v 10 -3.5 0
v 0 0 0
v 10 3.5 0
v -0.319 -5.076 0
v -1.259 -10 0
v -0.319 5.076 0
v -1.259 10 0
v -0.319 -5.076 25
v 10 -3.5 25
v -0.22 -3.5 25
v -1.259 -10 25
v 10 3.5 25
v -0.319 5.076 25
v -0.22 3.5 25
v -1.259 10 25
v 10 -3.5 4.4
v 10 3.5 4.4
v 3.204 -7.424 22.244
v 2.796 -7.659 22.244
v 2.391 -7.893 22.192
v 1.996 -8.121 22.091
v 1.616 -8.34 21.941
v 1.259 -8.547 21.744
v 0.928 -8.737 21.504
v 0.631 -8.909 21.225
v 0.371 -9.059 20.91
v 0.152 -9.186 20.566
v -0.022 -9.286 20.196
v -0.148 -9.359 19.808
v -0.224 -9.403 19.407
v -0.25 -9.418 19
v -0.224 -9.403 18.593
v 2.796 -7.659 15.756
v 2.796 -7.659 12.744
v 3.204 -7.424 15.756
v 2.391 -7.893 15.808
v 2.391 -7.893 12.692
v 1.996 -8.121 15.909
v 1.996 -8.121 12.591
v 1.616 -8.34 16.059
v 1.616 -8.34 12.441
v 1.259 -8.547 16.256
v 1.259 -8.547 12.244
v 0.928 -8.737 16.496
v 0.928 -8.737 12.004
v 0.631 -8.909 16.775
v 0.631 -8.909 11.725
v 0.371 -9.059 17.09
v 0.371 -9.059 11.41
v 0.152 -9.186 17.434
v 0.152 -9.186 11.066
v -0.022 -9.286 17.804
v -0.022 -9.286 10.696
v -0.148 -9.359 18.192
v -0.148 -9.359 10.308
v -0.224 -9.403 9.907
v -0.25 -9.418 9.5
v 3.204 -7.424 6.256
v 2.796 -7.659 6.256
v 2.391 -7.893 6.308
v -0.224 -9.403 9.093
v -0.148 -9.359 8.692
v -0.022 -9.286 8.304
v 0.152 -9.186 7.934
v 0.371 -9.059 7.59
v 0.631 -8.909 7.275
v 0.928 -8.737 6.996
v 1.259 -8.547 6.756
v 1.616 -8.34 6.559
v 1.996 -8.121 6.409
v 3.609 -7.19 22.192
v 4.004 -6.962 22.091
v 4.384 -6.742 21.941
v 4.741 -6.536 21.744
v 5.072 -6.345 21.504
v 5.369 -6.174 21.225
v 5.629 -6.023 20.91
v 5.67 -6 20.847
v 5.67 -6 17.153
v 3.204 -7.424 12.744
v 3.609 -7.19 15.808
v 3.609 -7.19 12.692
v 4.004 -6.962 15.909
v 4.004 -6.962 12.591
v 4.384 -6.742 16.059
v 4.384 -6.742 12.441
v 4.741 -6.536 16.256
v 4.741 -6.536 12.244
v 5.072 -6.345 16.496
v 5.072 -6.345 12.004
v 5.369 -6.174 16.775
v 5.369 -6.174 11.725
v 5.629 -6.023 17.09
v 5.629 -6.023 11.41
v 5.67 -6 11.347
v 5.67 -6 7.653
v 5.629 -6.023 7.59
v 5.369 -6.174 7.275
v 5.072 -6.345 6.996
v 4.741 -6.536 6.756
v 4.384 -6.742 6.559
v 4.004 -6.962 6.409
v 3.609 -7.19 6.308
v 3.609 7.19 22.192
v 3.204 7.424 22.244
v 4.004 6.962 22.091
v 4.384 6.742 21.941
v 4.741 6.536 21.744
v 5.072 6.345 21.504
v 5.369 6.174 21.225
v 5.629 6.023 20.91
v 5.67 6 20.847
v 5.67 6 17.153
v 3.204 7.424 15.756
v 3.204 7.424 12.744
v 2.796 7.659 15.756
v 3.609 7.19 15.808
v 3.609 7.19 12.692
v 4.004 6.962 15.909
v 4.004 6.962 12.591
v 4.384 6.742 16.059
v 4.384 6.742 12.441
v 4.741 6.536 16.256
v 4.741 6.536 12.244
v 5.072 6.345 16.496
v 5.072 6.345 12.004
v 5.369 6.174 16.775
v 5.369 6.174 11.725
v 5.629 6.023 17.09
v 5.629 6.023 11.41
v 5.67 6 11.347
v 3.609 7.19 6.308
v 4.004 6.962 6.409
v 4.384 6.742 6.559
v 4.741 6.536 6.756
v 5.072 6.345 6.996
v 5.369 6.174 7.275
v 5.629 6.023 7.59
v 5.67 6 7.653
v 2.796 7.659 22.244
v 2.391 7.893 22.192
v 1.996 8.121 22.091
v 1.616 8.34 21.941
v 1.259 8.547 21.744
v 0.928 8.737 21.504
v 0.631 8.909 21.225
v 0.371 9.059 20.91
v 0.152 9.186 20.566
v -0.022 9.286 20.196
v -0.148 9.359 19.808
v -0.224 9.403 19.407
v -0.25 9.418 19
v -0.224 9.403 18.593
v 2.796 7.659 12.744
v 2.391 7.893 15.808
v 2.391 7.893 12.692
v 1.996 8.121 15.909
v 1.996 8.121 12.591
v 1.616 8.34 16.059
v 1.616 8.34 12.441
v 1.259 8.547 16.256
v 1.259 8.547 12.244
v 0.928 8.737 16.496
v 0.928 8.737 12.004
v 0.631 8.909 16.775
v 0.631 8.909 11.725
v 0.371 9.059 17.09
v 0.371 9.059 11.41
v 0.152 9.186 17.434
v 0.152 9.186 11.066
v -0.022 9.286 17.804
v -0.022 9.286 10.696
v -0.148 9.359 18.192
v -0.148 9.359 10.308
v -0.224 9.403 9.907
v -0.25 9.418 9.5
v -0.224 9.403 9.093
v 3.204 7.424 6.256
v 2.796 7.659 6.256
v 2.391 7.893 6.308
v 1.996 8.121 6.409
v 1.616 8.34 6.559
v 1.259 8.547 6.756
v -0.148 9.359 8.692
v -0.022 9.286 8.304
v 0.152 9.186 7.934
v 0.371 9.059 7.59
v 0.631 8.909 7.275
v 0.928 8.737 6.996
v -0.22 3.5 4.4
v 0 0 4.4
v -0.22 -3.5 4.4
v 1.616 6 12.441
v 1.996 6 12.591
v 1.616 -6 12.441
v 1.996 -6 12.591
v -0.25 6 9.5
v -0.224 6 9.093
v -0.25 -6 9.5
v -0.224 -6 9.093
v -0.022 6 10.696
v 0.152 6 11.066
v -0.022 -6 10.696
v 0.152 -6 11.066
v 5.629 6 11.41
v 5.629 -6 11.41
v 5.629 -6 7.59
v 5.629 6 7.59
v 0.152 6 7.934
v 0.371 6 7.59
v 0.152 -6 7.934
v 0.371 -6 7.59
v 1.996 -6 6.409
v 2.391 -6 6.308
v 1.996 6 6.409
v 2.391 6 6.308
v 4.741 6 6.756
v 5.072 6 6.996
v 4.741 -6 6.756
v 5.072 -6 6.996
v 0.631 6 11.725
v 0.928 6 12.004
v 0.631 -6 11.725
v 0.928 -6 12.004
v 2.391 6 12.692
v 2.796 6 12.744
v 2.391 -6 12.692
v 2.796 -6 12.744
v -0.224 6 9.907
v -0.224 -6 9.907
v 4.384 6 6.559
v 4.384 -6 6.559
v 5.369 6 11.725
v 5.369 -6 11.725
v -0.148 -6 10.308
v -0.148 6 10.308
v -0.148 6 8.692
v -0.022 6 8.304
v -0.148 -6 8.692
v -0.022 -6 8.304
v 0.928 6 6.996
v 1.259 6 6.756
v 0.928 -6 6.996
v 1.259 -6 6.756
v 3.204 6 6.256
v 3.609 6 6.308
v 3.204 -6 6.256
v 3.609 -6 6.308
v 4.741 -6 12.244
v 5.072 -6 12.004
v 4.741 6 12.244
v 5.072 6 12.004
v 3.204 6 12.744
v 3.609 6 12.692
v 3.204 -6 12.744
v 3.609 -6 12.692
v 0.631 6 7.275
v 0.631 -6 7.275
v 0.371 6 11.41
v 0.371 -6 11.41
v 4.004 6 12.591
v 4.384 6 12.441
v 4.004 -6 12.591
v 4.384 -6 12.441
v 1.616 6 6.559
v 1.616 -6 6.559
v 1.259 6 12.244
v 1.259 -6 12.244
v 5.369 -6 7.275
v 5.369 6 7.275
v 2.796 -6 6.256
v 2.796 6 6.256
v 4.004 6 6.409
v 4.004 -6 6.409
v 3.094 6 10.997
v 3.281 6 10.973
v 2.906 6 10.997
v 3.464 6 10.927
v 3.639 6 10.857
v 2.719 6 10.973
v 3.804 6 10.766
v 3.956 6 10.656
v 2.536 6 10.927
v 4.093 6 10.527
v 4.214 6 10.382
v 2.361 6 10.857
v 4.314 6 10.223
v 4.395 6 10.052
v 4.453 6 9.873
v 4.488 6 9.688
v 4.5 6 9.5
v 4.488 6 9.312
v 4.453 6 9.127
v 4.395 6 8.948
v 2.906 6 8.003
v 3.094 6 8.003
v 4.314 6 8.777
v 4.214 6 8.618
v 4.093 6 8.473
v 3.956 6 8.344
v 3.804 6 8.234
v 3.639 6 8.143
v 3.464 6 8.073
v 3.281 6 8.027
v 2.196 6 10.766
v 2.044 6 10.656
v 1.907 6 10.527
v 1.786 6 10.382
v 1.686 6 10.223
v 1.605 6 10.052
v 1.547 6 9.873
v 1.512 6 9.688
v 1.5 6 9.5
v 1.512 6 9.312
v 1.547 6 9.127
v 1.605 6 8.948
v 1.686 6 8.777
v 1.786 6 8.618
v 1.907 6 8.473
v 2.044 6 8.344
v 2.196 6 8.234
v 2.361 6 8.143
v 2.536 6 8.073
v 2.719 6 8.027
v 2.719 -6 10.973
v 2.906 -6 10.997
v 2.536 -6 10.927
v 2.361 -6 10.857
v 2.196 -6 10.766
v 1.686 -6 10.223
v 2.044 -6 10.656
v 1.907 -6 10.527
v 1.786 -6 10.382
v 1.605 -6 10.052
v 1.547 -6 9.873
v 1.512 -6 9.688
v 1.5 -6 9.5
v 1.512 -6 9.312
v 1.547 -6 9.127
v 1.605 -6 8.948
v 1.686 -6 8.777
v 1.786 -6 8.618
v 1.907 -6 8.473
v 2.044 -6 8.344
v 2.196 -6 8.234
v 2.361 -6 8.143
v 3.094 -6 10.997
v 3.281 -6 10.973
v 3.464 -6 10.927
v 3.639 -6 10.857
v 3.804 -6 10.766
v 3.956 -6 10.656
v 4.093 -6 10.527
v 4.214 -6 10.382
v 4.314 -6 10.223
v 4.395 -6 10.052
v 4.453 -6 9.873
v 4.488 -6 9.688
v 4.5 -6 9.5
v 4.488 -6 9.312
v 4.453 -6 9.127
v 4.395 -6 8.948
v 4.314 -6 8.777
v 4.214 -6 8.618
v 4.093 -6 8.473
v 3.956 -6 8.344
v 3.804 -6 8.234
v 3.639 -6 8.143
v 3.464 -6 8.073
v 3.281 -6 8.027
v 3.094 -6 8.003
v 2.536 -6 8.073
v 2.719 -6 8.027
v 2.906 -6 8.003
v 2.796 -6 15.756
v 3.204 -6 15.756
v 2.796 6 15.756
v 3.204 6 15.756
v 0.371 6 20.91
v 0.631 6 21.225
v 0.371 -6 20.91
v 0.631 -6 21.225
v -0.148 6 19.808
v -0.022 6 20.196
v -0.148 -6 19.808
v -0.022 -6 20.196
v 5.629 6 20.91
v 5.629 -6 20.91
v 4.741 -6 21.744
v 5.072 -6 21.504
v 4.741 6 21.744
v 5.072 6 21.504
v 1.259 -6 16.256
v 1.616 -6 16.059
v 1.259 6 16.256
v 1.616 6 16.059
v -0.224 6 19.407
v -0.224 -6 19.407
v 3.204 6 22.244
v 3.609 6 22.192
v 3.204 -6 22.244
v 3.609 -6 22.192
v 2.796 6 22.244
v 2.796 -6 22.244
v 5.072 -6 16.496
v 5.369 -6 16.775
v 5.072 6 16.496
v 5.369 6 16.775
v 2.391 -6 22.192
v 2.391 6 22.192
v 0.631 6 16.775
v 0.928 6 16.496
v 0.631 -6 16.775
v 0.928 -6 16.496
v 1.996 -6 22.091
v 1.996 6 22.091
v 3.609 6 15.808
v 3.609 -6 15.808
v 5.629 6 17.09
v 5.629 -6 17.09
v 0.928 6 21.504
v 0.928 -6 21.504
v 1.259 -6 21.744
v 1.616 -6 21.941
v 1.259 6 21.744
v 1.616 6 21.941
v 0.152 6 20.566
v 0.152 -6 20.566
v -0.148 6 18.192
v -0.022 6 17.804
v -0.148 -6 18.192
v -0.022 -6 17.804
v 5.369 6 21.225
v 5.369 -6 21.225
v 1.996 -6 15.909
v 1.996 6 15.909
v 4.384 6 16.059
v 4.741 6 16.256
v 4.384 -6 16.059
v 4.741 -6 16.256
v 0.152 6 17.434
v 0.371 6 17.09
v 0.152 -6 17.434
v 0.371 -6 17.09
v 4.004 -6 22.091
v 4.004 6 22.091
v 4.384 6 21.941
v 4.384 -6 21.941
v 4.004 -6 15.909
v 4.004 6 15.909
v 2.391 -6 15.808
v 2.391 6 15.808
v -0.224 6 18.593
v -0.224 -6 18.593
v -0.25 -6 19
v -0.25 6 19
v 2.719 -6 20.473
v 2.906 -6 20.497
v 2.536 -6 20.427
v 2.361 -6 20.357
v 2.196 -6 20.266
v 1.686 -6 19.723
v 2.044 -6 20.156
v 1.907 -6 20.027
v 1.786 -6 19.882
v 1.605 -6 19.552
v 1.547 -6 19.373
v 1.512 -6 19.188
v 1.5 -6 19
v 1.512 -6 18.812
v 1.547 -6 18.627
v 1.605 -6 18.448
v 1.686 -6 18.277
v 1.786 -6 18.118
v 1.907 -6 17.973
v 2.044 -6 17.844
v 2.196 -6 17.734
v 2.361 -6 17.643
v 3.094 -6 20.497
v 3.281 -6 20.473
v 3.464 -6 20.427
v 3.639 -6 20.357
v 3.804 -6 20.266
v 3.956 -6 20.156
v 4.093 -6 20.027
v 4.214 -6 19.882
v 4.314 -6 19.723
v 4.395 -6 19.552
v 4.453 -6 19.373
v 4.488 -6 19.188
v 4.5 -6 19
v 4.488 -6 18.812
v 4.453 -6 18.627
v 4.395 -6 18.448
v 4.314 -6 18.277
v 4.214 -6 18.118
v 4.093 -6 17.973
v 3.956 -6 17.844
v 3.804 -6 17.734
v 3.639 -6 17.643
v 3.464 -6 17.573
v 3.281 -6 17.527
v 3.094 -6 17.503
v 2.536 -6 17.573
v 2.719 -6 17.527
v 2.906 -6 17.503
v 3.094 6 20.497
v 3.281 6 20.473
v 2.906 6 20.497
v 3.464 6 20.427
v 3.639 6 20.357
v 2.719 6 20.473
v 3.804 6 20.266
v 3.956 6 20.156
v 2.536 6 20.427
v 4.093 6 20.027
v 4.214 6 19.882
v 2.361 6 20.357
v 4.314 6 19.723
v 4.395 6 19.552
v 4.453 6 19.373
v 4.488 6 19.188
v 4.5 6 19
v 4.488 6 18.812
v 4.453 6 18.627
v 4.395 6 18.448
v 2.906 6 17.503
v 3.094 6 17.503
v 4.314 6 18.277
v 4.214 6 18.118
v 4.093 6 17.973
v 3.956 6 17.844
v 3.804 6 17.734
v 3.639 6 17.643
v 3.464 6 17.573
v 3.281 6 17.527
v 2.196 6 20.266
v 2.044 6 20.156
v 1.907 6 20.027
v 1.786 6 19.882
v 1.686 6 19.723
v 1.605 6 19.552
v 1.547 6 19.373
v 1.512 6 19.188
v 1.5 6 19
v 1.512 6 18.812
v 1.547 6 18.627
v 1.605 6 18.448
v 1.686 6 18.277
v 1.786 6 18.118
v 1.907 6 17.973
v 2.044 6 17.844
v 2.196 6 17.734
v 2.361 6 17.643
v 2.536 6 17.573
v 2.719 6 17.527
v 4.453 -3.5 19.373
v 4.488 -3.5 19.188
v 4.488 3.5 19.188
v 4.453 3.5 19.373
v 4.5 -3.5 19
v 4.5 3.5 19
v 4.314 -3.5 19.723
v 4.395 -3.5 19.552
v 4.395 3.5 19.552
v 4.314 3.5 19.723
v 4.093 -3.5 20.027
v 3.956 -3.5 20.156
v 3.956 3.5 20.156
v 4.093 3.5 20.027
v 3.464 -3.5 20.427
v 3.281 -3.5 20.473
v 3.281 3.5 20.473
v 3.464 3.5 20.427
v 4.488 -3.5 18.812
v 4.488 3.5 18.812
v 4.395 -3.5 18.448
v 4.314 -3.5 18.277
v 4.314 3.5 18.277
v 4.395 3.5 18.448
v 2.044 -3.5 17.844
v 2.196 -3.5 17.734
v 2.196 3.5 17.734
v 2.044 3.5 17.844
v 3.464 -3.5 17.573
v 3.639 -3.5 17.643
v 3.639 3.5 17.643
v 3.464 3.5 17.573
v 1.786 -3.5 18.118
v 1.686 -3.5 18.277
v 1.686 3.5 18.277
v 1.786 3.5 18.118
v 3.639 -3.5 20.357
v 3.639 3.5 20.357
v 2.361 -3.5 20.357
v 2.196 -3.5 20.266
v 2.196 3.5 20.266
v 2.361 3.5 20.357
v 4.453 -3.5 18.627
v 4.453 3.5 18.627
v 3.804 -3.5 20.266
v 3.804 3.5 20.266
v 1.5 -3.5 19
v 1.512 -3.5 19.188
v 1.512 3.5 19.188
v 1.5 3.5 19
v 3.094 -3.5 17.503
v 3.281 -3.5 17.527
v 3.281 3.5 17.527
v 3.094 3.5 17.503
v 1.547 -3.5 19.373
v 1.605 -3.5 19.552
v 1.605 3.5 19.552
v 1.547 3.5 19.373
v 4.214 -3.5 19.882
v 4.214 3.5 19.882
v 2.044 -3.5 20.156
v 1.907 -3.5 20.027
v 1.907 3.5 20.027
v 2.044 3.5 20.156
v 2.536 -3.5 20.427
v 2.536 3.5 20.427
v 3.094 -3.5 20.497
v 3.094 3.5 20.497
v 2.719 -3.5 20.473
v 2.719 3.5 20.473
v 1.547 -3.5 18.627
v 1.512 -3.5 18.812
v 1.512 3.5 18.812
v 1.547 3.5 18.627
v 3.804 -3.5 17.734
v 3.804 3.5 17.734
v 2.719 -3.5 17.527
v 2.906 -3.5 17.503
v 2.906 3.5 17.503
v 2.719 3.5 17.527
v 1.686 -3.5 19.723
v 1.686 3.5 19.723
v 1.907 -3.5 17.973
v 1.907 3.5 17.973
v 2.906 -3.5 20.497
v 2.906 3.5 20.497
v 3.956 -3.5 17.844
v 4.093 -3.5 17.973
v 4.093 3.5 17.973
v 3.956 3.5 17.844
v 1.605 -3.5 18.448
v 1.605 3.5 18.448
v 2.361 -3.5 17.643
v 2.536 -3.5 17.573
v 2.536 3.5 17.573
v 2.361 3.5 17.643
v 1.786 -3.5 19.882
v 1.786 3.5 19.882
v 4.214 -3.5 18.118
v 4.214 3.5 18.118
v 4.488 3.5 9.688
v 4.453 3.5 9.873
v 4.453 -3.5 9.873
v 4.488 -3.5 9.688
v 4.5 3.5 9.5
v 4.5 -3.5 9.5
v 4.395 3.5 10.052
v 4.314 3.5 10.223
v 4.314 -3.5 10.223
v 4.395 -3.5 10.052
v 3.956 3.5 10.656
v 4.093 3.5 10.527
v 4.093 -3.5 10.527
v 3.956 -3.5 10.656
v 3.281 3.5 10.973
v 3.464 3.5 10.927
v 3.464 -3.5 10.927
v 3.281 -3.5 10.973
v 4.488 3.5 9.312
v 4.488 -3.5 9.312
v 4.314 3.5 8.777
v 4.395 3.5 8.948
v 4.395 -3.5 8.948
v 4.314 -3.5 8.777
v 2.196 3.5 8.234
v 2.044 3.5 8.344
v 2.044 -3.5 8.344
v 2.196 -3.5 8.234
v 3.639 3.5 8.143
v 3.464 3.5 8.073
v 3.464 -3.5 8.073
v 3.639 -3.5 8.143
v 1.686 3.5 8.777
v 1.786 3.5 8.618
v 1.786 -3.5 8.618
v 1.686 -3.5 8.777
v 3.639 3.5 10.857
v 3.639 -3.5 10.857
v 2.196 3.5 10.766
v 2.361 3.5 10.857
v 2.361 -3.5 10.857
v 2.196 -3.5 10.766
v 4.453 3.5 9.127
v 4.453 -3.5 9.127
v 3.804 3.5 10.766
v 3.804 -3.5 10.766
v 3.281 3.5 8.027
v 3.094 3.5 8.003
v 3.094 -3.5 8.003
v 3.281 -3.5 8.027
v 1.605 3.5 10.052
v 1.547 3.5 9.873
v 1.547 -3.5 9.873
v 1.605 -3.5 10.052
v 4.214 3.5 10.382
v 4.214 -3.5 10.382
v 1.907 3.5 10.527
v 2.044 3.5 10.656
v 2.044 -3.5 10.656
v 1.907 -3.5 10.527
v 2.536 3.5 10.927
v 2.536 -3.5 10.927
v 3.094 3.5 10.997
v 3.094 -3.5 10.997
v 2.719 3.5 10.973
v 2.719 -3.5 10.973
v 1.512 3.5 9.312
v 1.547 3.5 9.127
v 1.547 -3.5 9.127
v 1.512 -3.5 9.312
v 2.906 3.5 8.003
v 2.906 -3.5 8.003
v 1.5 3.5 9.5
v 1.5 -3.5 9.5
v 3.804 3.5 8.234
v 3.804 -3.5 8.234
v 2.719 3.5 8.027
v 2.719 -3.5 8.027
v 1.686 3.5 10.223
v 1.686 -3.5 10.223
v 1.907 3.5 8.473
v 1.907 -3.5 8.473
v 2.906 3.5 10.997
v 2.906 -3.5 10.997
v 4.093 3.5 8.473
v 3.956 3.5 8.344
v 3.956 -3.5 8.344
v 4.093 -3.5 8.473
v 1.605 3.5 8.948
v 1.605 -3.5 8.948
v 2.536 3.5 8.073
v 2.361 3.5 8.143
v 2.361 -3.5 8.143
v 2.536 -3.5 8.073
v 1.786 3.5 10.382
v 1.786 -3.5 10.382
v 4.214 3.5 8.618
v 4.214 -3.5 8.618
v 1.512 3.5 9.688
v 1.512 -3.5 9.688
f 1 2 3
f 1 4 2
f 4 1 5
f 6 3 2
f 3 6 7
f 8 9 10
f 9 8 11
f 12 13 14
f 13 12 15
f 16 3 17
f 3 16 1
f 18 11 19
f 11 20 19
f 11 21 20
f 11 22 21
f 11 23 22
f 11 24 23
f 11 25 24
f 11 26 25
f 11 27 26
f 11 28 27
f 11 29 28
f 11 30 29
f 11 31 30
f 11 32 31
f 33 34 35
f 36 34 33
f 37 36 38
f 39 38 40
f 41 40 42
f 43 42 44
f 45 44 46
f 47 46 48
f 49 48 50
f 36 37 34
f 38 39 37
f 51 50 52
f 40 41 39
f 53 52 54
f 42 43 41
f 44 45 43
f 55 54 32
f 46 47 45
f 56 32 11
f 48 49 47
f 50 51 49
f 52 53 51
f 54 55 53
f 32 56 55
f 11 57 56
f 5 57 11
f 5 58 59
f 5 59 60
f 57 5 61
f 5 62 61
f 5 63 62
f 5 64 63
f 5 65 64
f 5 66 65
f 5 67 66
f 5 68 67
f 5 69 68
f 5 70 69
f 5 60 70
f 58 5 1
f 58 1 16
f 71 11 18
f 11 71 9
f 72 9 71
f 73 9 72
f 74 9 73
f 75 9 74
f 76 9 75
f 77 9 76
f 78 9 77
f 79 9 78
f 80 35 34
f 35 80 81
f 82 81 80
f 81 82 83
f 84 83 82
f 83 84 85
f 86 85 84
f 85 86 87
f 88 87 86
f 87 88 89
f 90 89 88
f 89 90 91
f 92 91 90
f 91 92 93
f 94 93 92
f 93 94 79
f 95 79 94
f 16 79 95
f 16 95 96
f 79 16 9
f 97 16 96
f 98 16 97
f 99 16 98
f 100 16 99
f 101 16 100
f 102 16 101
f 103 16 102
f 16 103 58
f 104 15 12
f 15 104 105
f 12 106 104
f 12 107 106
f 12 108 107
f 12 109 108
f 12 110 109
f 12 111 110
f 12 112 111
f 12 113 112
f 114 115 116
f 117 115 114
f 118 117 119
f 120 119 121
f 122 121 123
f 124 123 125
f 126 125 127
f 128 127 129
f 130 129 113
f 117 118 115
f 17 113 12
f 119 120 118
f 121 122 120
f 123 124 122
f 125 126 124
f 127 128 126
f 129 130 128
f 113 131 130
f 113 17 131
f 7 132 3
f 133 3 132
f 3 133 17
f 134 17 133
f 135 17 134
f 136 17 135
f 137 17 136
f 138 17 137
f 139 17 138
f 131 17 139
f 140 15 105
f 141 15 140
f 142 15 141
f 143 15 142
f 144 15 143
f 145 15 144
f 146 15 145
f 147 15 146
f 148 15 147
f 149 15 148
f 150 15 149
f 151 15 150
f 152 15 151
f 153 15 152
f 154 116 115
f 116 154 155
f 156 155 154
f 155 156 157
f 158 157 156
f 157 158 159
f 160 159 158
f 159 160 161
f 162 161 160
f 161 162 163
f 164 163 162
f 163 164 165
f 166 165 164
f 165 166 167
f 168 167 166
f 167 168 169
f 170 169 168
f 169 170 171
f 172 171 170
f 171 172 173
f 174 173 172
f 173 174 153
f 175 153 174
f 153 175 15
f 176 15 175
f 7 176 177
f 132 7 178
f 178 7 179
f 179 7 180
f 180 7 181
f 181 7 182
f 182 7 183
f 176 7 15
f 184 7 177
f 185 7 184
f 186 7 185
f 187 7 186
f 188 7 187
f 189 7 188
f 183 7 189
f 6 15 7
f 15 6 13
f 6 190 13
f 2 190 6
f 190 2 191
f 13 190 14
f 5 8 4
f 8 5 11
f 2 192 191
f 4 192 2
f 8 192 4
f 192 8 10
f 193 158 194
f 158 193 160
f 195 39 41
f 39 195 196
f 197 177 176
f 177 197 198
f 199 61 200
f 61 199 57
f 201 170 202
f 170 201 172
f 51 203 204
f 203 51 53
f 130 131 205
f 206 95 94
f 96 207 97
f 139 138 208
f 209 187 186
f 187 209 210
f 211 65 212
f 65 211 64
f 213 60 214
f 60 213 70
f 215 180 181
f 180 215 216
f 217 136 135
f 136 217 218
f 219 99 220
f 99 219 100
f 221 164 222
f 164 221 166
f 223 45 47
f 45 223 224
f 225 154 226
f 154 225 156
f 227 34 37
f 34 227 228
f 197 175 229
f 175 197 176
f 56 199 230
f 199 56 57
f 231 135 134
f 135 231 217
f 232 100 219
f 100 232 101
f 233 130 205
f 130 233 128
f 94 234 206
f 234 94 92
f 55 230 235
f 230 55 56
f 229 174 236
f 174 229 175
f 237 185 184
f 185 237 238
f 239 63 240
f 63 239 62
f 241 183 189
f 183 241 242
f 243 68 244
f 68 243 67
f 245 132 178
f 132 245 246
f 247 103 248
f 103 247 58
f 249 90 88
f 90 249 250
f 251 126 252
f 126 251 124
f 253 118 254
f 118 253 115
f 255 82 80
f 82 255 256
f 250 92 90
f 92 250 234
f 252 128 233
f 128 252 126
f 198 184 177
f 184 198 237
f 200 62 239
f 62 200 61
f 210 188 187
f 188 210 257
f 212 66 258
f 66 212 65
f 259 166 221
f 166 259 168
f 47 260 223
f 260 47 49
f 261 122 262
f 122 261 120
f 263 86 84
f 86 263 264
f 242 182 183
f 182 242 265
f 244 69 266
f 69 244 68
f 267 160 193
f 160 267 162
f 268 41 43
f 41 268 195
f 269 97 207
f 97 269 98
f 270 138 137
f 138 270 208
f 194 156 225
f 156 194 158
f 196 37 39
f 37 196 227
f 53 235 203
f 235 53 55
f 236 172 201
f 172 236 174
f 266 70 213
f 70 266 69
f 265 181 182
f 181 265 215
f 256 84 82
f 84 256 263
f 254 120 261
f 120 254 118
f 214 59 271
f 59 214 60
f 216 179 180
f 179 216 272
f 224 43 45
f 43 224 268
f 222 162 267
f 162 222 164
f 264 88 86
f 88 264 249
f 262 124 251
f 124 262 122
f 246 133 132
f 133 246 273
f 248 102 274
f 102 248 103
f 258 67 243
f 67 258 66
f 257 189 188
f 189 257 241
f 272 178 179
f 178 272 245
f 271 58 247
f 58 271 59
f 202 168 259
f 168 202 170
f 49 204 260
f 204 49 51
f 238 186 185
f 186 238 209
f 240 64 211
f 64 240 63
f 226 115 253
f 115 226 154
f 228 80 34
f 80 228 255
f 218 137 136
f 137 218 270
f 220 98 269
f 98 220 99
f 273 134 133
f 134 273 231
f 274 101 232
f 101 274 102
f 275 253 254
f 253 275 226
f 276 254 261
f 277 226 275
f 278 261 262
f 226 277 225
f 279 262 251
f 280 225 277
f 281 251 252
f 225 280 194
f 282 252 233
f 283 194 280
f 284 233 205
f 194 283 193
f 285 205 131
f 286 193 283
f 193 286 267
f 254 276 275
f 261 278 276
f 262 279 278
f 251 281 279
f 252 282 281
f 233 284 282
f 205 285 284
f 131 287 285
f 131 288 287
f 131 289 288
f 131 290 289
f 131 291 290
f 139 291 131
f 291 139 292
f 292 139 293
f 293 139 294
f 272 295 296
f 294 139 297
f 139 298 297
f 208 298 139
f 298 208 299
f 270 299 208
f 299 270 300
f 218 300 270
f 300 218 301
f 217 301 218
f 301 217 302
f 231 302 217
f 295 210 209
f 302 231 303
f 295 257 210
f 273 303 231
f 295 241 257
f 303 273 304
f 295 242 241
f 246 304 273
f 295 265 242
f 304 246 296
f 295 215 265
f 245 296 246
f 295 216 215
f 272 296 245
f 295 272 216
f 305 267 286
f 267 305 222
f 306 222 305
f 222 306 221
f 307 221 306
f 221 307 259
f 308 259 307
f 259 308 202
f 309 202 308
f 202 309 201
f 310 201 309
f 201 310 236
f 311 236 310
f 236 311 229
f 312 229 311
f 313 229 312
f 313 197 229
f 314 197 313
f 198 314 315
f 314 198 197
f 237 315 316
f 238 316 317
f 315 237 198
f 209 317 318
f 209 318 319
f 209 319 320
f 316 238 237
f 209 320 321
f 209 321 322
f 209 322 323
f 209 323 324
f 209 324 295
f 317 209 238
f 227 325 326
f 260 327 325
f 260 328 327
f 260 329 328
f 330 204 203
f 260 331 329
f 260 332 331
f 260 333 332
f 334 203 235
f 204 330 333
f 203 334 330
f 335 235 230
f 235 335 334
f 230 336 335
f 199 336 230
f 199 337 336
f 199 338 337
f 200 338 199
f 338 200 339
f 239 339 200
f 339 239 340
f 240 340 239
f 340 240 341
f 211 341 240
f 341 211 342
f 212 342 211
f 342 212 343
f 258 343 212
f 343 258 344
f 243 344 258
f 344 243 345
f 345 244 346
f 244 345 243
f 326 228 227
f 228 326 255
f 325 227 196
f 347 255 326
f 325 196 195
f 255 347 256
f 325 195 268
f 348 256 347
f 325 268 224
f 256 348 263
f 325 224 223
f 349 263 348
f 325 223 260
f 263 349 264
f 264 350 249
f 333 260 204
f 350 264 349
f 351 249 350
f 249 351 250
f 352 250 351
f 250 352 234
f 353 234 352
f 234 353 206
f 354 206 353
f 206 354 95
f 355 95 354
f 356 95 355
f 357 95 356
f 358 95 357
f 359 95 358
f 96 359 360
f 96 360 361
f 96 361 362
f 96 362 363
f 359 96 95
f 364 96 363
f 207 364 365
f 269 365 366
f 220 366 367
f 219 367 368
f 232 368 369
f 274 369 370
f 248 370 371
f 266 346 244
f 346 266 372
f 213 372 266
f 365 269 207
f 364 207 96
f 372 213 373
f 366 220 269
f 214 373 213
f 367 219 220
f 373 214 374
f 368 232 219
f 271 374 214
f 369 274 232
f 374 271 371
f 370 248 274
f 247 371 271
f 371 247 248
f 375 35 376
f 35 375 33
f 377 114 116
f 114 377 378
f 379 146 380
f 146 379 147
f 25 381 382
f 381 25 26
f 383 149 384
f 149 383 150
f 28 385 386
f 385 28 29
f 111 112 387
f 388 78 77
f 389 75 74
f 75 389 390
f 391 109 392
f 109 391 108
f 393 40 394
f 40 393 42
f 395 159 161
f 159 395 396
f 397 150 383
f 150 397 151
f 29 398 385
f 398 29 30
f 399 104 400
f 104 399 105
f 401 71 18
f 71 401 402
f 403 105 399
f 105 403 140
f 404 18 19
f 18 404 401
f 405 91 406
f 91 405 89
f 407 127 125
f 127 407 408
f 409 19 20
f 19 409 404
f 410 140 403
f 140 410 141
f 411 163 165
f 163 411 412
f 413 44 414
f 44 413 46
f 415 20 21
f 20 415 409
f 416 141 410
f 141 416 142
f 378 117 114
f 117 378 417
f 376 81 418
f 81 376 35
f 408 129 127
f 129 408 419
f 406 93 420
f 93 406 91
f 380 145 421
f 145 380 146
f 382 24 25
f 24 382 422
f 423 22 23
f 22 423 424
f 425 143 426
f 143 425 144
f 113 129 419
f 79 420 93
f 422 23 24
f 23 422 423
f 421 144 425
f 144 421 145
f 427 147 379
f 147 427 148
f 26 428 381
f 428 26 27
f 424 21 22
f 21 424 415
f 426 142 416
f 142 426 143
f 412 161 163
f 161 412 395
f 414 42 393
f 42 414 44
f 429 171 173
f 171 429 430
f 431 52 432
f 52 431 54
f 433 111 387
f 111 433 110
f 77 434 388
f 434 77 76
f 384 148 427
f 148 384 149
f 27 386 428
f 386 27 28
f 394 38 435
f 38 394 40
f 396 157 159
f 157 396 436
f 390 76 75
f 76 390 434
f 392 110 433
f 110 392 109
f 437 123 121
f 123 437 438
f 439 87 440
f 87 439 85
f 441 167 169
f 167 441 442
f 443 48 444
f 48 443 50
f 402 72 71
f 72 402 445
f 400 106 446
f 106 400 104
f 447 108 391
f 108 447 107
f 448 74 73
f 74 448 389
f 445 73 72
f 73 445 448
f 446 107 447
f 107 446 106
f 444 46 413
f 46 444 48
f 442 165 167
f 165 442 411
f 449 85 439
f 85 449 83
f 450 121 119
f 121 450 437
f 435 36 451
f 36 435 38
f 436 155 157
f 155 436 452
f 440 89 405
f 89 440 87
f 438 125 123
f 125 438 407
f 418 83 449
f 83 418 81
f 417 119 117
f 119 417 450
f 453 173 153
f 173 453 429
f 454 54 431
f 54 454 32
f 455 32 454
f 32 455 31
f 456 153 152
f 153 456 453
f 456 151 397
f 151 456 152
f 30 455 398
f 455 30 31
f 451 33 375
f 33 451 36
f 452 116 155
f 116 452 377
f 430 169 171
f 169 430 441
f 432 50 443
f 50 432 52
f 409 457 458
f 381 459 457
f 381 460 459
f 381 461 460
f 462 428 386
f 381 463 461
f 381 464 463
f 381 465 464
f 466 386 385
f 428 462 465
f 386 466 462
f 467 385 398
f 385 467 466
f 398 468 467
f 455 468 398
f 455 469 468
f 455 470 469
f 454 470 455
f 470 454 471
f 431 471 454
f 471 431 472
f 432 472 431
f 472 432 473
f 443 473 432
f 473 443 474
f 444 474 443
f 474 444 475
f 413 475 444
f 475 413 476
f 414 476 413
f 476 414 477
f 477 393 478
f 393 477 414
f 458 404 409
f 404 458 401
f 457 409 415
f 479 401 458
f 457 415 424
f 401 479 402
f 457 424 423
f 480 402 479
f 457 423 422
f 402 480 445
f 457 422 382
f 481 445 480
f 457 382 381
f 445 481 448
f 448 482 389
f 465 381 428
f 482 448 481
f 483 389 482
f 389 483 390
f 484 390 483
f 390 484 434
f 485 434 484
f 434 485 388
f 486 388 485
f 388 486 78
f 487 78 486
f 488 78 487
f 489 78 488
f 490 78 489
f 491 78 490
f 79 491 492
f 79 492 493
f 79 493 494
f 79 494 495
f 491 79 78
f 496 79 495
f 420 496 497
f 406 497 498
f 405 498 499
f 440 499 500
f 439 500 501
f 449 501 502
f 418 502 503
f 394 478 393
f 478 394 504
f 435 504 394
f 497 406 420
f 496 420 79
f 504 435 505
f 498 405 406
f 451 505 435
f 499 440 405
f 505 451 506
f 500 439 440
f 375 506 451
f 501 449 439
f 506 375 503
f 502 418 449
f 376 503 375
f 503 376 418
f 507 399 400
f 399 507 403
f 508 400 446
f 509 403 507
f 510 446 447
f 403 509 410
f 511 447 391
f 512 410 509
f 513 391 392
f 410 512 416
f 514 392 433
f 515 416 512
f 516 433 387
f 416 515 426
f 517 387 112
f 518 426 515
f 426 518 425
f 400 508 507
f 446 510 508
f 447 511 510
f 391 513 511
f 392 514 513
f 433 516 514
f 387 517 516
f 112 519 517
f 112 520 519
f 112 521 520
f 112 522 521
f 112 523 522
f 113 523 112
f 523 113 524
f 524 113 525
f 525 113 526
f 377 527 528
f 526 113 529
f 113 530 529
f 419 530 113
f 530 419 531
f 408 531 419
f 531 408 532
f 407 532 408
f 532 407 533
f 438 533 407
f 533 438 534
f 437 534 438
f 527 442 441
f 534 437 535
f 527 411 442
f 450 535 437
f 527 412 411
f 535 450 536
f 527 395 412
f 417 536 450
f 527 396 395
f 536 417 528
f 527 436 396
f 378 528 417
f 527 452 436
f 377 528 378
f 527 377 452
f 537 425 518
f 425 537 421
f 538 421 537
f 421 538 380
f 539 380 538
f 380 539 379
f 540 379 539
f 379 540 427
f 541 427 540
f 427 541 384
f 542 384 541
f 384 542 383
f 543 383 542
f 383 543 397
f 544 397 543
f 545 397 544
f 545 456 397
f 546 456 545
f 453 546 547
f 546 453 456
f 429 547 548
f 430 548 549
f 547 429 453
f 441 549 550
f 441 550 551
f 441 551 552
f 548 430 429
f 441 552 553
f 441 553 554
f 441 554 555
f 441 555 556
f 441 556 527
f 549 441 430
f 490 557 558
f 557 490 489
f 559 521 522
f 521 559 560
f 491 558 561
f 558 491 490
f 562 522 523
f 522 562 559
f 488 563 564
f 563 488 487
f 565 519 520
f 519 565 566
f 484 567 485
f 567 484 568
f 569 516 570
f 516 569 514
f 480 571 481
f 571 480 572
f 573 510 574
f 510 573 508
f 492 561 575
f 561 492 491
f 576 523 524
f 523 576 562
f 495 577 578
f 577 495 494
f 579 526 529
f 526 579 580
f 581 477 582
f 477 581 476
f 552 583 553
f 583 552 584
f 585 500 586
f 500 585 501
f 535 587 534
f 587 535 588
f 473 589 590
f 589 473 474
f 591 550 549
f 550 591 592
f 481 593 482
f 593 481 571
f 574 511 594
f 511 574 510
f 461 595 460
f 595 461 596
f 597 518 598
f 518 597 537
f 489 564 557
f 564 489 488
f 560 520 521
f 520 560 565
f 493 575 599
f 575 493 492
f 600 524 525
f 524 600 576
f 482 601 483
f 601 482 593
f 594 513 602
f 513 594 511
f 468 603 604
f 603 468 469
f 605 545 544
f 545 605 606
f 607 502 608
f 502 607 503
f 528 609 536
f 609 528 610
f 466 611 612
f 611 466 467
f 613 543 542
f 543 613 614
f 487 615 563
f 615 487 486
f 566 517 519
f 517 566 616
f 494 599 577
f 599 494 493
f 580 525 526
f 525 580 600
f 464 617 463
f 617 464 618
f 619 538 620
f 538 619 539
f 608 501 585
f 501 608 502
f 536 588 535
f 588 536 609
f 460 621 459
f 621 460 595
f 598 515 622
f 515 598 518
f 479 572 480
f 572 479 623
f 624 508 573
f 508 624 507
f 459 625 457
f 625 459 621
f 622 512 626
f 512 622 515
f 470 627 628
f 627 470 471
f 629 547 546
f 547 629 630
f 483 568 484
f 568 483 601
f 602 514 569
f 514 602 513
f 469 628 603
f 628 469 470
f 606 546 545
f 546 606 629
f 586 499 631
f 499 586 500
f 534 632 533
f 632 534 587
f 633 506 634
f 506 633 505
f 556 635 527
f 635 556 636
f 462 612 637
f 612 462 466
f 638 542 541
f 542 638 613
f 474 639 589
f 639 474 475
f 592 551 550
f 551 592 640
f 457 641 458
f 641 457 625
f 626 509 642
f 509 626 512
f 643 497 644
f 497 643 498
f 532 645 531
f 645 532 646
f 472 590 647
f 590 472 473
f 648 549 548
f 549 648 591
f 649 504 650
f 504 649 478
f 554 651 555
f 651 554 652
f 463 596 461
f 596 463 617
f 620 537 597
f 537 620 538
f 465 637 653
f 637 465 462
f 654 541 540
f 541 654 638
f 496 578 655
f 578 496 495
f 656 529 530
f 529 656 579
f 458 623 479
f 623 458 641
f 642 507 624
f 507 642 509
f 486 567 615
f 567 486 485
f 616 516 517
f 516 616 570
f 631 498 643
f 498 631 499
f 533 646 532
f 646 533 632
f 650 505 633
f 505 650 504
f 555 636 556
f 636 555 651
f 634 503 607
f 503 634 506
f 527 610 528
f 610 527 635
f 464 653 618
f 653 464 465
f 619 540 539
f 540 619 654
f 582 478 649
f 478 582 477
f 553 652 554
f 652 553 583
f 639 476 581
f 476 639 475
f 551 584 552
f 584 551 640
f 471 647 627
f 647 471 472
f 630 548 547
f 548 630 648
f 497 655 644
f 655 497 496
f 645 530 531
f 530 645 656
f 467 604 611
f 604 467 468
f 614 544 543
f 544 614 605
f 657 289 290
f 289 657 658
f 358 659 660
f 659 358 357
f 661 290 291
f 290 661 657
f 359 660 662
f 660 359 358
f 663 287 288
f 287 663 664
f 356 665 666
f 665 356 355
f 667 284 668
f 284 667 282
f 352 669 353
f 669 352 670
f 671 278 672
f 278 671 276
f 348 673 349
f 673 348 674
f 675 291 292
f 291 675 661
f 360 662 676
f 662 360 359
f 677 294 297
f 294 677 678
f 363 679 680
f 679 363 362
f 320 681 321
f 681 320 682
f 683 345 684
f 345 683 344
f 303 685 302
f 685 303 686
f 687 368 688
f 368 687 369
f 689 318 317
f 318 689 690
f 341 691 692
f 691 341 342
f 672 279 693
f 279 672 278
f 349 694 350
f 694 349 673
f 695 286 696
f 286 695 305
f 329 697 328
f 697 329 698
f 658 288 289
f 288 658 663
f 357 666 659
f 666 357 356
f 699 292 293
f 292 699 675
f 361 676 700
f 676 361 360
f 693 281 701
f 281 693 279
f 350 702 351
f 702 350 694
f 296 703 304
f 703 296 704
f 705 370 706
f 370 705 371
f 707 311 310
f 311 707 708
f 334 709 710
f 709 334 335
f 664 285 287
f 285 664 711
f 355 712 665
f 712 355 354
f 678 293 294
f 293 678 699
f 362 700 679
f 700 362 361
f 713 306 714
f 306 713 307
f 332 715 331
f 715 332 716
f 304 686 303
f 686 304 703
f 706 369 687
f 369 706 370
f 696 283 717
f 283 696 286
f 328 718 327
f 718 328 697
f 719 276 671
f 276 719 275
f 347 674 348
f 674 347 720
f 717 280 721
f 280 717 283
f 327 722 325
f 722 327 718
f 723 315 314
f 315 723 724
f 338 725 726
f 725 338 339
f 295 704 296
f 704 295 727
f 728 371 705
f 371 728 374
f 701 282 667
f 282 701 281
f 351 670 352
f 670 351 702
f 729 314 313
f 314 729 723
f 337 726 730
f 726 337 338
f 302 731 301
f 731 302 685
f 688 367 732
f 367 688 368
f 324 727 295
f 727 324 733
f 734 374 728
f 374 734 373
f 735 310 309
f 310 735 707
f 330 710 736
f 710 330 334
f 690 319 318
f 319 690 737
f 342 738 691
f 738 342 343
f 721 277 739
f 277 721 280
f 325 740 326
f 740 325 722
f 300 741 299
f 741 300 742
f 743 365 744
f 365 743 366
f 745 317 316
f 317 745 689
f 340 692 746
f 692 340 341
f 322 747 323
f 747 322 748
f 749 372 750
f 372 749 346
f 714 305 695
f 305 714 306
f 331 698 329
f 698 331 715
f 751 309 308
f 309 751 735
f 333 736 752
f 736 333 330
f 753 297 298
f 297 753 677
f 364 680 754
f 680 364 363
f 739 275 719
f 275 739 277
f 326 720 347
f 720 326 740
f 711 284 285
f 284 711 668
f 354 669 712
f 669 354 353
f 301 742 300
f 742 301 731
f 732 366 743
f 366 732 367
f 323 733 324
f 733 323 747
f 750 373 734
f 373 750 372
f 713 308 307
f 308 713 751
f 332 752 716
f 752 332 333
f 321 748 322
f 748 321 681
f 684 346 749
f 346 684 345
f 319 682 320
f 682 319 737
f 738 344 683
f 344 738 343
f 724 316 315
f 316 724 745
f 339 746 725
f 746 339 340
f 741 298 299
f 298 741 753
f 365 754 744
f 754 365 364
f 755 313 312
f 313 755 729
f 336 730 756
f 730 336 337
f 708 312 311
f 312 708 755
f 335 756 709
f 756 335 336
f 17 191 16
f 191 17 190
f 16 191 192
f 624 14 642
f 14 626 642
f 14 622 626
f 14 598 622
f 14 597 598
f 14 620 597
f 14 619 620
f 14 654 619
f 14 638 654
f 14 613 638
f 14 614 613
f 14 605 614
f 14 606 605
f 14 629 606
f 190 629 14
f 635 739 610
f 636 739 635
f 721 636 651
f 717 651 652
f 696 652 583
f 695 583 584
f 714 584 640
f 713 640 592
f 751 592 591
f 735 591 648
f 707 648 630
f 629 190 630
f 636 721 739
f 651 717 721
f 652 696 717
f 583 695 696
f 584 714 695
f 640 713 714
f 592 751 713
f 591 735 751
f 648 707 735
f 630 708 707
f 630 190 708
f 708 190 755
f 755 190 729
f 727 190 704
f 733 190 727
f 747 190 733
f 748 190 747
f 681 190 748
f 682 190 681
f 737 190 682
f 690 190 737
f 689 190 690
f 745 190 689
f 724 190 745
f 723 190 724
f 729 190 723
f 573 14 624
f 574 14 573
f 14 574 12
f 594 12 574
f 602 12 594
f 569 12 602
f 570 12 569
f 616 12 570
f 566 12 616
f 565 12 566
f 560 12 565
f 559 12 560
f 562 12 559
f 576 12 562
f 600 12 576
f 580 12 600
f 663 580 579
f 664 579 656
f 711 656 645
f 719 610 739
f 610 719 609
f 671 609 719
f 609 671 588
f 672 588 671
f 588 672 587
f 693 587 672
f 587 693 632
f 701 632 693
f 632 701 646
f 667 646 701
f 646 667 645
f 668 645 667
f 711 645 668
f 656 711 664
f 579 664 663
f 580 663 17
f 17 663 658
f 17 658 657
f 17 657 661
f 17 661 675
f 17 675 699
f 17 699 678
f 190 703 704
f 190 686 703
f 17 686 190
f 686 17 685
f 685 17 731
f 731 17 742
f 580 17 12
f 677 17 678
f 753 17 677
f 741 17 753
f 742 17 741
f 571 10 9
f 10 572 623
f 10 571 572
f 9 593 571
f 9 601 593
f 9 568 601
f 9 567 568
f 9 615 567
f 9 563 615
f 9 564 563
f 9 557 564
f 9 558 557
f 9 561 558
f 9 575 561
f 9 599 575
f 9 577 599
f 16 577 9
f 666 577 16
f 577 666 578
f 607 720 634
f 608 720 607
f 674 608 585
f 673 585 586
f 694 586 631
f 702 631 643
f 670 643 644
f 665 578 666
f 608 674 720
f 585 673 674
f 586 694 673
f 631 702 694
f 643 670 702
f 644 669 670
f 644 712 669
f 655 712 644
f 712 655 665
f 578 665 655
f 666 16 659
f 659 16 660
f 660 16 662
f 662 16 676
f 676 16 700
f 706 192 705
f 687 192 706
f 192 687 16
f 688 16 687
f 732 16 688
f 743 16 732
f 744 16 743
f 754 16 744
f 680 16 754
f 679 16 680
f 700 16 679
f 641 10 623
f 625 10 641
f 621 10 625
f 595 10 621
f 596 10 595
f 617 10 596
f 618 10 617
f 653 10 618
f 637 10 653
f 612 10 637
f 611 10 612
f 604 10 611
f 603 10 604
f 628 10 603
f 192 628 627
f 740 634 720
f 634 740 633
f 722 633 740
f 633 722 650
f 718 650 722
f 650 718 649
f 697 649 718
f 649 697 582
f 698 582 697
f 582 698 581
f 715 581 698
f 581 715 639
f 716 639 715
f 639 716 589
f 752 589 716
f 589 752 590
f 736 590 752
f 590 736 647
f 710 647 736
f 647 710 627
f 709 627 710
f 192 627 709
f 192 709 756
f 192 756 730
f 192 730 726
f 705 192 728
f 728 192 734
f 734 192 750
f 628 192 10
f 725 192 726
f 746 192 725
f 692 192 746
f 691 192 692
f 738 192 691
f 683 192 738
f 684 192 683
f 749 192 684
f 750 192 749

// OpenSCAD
$fn=50;
dia_PVC=81;
dia_trous=3;
larg=20;
long=25;
long_switch=21;
larg_switch=7;
prof_switch=10;
dist_trous=9.5;
avancement_trous=4;
dia_tete_vis=6.5;
dist_tete=12;

module PVC()
{
  translate([-dia_PVC/2,0,0])
    //difference()
    //{
        cylinder(d=dia_PVC,h=long);
        //translate([-0.1,0,-0.1])
            //cylinder(d=dia_PVC-0.2,h=long+0.2);
    //}
}

module base()
{
    difference()
    {
        PVC();
        translate([-dia_PVC,larg/2,-0.1])
            cube([dia_PVC,dia_PVC/2,long+0.2]);
        translate([-dia_PVC,-dia_PVC/2-larg/2,-0.1])
            cube([dia_PVC,dia_PVC/2,long+0.2]);
        translate([-dia_PVC-10,-dia_PVC/4,-0.1])
            cube([dia_PVC,dia_PVC/2,long+0.2]);
    }  
}

module switch()
{
    translate([0,-larg_switch/2,long-long_switch])
        cube([prof_switch,larg_switch,long_switch]);
}

module support_base()
{
    difference()
    {
        hull()
        {
                base();
                translate([0,-larg_switch/2,0])
                    cube([prof_switch,larg_switch,long]);
        }
        translate([0,0,-0.1])
            scale([1,1,1.2])
                PVC();
    }
}

module trous()
{
    translate([7,0,5+long-long_switch+0.5])
    rotate([90,0,0])
        union()
        {
            cylinder(d=dia_trous,h=larg,center=true);
            difference()
            {
                cylinder(d=dia_tete_vis,h=larg,center=true);
                cylinder(d=dia_tete_vis+0.2,h=dist_tete,center=true);
            }
            translate([0,dist_trous,0])
            {
                cylinder(d=dia_trous,h=larg,center=true);
                difference()
                {
                    cylinder(d=dia_tete_vis,h=larg,center=true);
                    cylinder(d=dia_tete_vis+0.2,h=dist_tete,center=true);
                }
            }
        }
}

module support_complet()
{
    difference()
    {
        support_base();
        translate([-avancement_trous,0,0])
        union()
        {
            scale([2,1,1.1])
                switch();
            trous();
        }
    }
}

support_complet();
